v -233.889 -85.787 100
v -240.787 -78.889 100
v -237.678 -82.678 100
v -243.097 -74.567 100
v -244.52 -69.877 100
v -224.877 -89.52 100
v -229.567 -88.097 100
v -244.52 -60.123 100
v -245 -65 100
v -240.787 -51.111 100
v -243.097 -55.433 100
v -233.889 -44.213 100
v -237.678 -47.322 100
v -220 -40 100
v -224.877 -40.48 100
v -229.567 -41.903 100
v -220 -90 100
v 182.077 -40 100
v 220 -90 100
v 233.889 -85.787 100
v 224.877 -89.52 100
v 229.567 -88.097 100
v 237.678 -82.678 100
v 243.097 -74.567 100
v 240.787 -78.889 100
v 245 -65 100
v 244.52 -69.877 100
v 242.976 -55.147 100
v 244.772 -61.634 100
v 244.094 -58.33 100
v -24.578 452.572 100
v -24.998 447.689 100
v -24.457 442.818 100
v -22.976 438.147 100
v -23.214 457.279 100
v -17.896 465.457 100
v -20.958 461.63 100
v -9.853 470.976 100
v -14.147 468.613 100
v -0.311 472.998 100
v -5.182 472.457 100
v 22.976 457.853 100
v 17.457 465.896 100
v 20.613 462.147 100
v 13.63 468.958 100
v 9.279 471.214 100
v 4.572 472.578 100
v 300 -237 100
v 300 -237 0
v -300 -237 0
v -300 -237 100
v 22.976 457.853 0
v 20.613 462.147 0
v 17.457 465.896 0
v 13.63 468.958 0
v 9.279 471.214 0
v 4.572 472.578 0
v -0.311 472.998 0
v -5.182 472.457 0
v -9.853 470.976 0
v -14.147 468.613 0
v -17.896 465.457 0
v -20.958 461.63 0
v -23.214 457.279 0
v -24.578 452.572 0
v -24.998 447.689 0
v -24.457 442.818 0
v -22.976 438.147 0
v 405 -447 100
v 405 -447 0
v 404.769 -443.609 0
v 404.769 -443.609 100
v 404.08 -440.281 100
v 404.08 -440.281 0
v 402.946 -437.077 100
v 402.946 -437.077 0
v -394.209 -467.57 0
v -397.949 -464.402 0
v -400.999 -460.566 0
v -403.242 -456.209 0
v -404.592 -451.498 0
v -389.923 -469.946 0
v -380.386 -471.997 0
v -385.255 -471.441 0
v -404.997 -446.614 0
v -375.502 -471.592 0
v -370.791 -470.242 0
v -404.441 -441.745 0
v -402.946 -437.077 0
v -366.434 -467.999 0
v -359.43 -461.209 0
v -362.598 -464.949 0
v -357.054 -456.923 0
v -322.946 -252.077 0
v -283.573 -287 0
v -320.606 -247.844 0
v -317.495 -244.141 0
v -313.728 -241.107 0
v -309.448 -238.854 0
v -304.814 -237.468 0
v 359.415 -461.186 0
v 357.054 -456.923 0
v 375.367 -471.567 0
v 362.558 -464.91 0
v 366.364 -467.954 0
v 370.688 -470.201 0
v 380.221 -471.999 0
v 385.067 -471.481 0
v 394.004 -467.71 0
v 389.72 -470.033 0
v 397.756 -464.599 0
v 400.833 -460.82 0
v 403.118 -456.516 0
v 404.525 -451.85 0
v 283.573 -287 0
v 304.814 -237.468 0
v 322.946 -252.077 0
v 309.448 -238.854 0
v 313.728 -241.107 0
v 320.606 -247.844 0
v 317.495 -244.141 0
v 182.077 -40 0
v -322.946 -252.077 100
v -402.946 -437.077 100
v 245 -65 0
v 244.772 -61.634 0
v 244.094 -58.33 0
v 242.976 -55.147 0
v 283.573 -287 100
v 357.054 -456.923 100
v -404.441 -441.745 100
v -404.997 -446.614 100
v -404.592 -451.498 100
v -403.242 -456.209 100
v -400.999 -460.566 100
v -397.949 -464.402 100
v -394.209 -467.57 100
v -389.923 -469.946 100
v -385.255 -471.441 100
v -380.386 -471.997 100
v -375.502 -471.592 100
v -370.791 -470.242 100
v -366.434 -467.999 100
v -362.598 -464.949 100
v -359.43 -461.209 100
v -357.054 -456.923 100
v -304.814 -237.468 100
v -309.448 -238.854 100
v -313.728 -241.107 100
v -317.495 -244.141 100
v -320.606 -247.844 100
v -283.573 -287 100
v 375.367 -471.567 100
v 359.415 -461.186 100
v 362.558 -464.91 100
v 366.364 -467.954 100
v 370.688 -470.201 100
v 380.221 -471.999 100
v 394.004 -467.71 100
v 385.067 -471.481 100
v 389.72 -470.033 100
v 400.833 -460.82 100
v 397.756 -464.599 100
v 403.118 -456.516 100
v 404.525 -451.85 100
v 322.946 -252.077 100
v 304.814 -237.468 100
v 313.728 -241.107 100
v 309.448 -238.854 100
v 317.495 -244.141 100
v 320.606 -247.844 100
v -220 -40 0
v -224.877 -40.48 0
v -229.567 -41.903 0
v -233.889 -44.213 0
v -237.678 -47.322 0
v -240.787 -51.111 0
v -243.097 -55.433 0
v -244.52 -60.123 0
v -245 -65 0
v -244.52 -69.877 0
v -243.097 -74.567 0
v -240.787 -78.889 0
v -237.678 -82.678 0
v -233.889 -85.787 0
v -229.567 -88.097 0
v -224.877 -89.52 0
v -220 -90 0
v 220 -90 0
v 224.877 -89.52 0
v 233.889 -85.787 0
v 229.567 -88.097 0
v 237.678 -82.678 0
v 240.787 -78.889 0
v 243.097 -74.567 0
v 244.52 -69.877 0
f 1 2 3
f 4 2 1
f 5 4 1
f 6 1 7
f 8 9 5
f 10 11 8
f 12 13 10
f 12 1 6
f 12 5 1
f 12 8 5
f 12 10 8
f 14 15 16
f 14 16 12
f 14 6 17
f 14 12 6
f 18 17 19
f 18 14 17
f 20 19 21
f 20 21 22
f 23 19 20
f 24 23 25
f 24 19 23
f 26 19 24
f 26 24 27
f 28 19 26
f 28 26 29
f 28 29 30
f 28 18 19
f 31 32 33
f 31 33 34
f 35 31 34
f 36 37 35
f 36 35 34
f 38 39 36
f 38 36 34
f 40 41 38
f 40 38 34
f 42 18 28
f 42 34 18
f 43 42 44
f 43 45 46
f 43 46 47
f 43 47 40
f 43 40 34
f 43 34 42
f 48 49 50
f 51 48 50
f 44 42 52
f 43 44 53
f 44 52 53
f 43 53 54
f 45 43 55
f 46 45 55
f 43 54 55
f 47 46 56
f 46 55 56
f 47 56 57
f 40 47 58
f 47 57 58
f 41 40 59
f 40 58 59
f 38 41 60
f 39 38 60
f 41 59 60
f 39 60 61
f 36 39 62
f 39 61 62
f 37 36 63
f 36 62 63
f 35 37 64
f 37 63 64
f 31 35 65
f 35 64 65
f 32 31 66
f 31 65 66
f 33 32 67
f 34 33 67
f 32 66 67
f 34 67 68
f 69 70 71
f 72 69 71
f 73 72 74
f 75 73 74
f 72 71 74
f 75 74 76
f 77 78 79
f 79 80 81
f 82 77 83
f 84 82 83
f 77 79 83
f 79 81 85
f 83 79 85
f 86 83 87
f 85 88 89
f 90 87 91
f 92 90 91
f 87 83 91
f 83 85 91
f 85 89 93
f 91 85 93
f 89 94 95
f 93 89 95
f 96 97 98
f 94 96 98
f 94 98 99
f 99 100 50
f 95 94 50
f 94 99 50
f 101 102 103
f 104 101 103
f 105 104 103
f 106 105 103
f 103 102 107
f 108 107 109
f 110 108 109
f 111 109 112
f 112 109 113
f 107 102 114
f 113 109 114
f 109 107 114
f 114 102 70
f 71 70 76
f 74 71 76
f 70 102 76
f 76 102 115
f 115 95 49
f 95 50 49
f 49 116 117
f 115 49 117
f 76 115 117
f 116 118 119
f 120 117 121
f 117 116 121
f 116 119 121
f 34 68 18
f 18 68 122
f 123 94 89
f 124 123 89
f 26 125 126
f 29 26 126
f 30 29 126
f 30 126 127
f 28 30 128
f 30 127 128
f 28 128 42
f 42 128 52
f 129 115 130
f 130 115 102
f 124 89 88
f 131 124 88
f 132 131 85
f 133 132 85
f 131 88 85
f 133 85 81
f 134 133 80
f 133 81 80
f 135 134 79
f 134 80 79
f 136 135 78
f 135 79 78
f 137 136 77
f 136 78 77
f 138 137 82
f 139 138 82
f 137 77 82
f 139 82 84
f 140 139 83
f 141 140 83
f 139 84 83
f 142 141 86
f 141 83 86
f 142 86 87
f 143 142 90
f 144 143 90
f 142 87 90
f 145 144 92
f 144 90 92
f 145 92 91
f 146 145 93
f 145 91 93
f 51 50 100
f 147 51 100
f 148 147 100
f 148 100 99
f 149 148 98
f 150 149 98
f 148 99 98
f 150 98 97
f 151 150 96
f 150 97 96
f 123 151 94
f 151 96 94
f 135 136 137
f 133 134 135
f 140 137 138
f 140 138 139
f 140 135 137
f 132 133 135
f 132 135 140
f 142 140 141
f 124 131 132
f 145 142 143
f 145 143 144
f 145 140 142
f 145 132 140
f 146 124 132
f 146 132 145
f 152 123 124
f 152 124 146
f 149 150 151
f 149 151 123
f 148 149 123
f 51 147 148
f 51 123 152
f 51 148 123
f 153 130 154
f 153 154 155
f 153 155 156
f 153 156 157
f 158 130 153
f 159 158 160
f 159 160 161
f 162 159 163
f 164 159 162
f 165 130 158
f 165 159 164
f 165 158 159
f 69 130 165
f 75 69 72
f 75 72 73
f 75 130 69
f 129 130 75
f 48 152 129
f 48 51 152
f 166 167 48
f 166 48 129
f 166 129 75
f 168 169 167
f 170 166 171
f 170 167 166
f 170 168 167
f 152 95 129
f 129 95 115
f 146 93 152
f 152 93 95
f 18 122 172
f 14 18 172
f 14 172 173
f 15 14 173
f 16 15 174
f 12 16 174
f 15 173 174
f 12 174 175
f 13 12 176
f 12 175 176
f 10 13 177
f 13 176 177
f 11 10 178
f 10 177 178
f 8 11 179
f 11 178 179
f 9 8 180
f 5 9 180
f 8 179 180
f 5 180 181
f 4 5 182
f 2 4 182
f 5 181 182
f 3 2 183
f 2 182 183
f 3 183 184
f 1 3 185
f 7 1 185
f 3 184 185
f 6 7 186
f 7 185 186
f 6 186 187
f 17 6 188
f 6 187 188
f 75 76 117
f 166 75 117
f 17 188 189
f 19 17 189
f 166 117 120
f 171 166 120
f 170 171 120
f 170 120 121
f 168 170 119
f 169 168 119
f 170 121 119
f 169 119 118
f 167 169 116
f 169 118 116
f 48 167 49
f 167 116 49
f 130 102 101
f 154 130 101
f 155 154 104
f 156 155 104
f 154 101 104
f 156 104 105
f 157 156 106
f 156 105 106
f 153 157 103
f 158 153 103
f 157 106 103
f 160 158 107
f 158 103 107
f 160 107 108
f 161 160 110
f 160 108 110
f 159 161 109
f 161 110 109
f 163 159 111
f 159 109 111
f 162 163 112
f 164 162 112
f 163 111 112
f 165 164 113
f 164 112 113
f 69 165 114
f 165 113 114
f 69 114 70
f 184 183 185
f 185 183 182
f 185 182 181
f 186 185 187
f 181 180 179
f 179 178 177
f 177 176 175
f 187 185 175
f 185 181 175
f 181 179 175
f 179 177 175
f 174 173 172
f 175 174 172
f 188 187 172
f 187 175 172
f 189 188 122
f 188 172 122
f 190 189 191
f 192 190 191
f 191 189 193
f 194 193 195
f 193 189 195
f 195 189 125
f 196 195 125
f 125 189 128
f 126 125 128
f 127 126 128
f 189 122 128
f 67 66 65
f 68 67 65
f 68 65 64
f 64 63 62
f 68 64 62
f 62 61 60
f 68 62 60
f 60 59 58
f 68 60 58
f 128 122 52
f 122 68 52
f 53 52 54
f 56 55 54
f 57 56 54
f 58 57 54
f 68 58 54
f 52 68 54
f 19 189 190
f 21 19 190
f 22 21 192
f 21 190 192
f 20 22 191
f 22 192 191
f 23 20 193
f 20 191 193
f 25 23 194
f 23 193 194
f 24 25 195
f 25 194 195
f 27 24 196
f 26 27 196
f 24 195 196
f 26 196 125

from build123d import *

# Parameters (mm, degrees)
F1_DEPTH = 100


with BuildPart() as f1:
    # F0 (on Top) → F1 (new body)
    with BuildSketch(Plane.XY):
        with BuildLine():
            ThreePointArc((-22.9763084875, 438.1466123446), (5.0295272051, 423.5111483304), (25, 448))
            ThreePointArc((25, 448), (24.4888516696, 453.0295272051), (22.9763084875, 457.8533876554))
            ThreePointArc((22.9763084875, 457.8533876554), (-9.8533876554, 470.9763084875), (-22.9763084875, 438.1466123446))
        make_face()
        with BuildLine():
            ThreePointArc((22.9763084875, 457.8533876554), (24.4888516696, 453.0295272051), (25, 448))
            ThreePointArc((25, 448), (5.0295272051, 423.5111483304), (-22.9763084875, 438.1466123446))
            Line((-22.9763084875, 438.1466123446), (182.0768196135, -40))
            Line((182.0768196135, -40), (220, -40))
            ThreePointArc((220, -40), (233.7598202861, -44.1273541281), (242.9763084875, -55.1466123446))
            Line((242.9763084875, -55.1466123446), (22.9763084875, 457.8533876554))
        make_face()
        with BuildLine():
            ThreePointArc((245, -65), (244.4888516696, -59.9704727949), (242.9763084875, -55.1466123446))
            ThreePointArc((242.9763084875, -55.1466123446), (233.7598202861, -44.1273541281), (220, -40))
            ThreePointArc((220, -40), (199.1273541281, -51.2401797139), (197.0236915125, -74.8533876554))
            ThreePointArc((197.0236915125, -74.8533876554), (206.2401797139, -85.8726458719), (220, -90))
            ThreePointArc((220, -90), (237.6776695297, -82.6776695297), (245, -65))
        make_face()
        with BuildLine():
            Line((220, -40), (182.0768196135, -40))
            Line((182.0768196135, -40), (197.0236915125, -74.8533876554))
            ThreePointArc((197.0236915125, -74.8533876554), (199.1273541281, -51.2401797139), (220, -40))
        make_face()
        with BuildLine():
            Line((197.0236915125, -74.8533876554), (182.0768196135, -40))
            Line((182.0768196135, -40), (-220, -40))
            ThreePointArc((-220, -40), (-202.3223304703, -47.3223304703), (-195, -65))
            ThreePointArc((-195, -65), (-202.3223304703, -82.6776695297), (-220, -90))
            Line((-220, -90), (220, -90))
            ThreePointArc((220, -90), (206.2401797139, -85.8726458719), (197.0236915125, -74.8533876554))
        make_face()
        with BuildLine():
            ThreePointArc((-195, -65), (-202.3223304703, -47.3223304703), (-220, -40))
            ThreePointArc((-220, -40), (-245, -65), (-220, -90))
            ThreePointArc((-220, -90), (-202.3223304703, -82.6776695297), (-195, -65))
        make_face()
    extrude(amount=F1_DEPTH)


with BuildPart() as f1b:
    # F0 (on Top) → F1, piece 2 (new body)
    with BuildSketch(Plane.XY):
        with BuildLine():
            ThreePointArc((-277.053574101, -271.9227787671), (-275.518776098, -267.0665250678), (-275, -262))
            ThreePointArc((-275, -262), (-282.3223304703, -244.3223304703), (-300, -237))
            ThreePointArc((-300, -237), (-313.7282652003, -241.1065863347), (-322.946425899, -252.0772212329))
            ThreePointArc((-322.946425899, -252.0772212329), (-320.8934136653, -275.7282652003), (-300, -287))
            ThreePointArc((-300, -287), (-286.2717347997, -282.8934136653), (-277.053574101, -271.9227787671))
        make_face()
        with BuildLine():
            ThreePointArc((-300, -237), (-282.3223304703, -244.3223304703), (-275, -262))
            ThreePointArc((-275, -262), (-275.518776098, -267.0665250678), (-277.053574101, -271.9227787671))
            Line((-277.053574101, -271.9227787671), (-283.573453553, -287))
            Line((-283.573453553, -287), (283.573453553, -287))
            Line((283.573453553, -287), (277.053574101, -271.9227787671))
            ThreePointArc((277.053574101, -271.9227787671), (279.1065863347, -248.2717347997), (300, -237))
            Line((300, -237), (-300, -237))
        make_face()
        with BuildLine():
            Line((-283.573453553, -287), (-277.053574101, -271.9227787671))
            ThreePointArc((-277.053574101, -271.9227787671), (-286.2717347997, -282.8934136653), (-300, -287))
            Line((-300, -287), (-283.573453553, -287))
        make_face()
        with BuildLine():
            ThreePointArc((-300, -287), (-320.8934136653, -275.7282652003), (-322.946425899, -252.0772212329))
            Line((-322.946425899, -252.0772212329), (-402.946425899, -437.0772212329))
            ThreePointArc((-402.946425899, -437.0772212329), (-374.9334749322, -422.518776098), (-355, -447))
            ThreePointArc((-355, -447), (-355.518776098, -452.0665250678), (-357.053574101, -456.9227787671))
            Line((-357.053574101, -456.9227787671), (-283.573453553, -287))
            Line((-283.573453553, -287), (-300, -287))
        make_face()
        with BuildLine():
            ThreePointArc((322.946425899, -252.0772212329), (313.7282652003, -241.1065863347), (300, -237))
            ThreePointArc((300, -237), (279.1065863347, -248.2717347997), (277.053574101, -271.9227787671))
            ThreePointArc((277.053574101, -271.9227787671), (286.2717347997, -282.8934136653), (300, -287))
            ThreePointArc((300, -287), (317.6776695297, -279.6776695297), (325, -262))
            ThreePointArc((325, -262), (324.481223902, -256.9334749322), (322.946425899, -252.0772212329))
        make_face()
        with BuildLine():
            ThreePointArc((-355, -447), (-374.9334749322, -422.518776098), (-402.946425899, -437.0772212329))
            ThreePointArc((-402.946425899, -437.0772212329), (-389.9227787671, -469.946425899), (-357.053574101, -456.9227787671))
            ThreePointArc((-357.053574101, -456.9227787671), (-355.518776098, -452.0665250678), (-355, -447))
        make_face()
        with BuildLine():
            Line((402.946425899, -437.0772212329), (322.946425899, -252.0772212329))
            ThreePointArc((322.946425899, -252.0772212329), (324.481223902, -256.9334749322), (325, -262))
            ThreePointArc((325, -262), (317.6776695297, -279.6776695297), (300, -287))
            Line((300, -287), (283.573453553, -287))
            Line((283.573453553, -287), (357.053574101, -456.9227787671))
            ThreePointArc((357.053574101, -456.9227787671), (370.0772212329, -424.053574101), (402.946425899, -437.0772212329))
        make_face()
        with BuildLine():
            ThreePointArc((300, -287), (286.2717347997, -282.8934136653), (277.053574101, -271.9227787671))
            Line((277.053574101, -271.9227787671), (283.573453553, -287))
            Line((283.573453553, -287), (300, -287))
        make_face()
        with BuildLine():
            ThreePointArc((405, -447), (404.481223902, -441.9334749322), (402.946425899, -437.0772212329))
            ThreePointArc((402.946425899, -437.0772212329), (370.0772212329, -424.053574101), (357.053574101, -456.9227787671))
            ThreePointArc((357.053574101, -456.9227787671), (385.0665250678, -471.481223902), (405, -447))
        make_face()
    extrude(amount=F1_DEPTH)


solid = Compound([f1.part, f1b.part])
